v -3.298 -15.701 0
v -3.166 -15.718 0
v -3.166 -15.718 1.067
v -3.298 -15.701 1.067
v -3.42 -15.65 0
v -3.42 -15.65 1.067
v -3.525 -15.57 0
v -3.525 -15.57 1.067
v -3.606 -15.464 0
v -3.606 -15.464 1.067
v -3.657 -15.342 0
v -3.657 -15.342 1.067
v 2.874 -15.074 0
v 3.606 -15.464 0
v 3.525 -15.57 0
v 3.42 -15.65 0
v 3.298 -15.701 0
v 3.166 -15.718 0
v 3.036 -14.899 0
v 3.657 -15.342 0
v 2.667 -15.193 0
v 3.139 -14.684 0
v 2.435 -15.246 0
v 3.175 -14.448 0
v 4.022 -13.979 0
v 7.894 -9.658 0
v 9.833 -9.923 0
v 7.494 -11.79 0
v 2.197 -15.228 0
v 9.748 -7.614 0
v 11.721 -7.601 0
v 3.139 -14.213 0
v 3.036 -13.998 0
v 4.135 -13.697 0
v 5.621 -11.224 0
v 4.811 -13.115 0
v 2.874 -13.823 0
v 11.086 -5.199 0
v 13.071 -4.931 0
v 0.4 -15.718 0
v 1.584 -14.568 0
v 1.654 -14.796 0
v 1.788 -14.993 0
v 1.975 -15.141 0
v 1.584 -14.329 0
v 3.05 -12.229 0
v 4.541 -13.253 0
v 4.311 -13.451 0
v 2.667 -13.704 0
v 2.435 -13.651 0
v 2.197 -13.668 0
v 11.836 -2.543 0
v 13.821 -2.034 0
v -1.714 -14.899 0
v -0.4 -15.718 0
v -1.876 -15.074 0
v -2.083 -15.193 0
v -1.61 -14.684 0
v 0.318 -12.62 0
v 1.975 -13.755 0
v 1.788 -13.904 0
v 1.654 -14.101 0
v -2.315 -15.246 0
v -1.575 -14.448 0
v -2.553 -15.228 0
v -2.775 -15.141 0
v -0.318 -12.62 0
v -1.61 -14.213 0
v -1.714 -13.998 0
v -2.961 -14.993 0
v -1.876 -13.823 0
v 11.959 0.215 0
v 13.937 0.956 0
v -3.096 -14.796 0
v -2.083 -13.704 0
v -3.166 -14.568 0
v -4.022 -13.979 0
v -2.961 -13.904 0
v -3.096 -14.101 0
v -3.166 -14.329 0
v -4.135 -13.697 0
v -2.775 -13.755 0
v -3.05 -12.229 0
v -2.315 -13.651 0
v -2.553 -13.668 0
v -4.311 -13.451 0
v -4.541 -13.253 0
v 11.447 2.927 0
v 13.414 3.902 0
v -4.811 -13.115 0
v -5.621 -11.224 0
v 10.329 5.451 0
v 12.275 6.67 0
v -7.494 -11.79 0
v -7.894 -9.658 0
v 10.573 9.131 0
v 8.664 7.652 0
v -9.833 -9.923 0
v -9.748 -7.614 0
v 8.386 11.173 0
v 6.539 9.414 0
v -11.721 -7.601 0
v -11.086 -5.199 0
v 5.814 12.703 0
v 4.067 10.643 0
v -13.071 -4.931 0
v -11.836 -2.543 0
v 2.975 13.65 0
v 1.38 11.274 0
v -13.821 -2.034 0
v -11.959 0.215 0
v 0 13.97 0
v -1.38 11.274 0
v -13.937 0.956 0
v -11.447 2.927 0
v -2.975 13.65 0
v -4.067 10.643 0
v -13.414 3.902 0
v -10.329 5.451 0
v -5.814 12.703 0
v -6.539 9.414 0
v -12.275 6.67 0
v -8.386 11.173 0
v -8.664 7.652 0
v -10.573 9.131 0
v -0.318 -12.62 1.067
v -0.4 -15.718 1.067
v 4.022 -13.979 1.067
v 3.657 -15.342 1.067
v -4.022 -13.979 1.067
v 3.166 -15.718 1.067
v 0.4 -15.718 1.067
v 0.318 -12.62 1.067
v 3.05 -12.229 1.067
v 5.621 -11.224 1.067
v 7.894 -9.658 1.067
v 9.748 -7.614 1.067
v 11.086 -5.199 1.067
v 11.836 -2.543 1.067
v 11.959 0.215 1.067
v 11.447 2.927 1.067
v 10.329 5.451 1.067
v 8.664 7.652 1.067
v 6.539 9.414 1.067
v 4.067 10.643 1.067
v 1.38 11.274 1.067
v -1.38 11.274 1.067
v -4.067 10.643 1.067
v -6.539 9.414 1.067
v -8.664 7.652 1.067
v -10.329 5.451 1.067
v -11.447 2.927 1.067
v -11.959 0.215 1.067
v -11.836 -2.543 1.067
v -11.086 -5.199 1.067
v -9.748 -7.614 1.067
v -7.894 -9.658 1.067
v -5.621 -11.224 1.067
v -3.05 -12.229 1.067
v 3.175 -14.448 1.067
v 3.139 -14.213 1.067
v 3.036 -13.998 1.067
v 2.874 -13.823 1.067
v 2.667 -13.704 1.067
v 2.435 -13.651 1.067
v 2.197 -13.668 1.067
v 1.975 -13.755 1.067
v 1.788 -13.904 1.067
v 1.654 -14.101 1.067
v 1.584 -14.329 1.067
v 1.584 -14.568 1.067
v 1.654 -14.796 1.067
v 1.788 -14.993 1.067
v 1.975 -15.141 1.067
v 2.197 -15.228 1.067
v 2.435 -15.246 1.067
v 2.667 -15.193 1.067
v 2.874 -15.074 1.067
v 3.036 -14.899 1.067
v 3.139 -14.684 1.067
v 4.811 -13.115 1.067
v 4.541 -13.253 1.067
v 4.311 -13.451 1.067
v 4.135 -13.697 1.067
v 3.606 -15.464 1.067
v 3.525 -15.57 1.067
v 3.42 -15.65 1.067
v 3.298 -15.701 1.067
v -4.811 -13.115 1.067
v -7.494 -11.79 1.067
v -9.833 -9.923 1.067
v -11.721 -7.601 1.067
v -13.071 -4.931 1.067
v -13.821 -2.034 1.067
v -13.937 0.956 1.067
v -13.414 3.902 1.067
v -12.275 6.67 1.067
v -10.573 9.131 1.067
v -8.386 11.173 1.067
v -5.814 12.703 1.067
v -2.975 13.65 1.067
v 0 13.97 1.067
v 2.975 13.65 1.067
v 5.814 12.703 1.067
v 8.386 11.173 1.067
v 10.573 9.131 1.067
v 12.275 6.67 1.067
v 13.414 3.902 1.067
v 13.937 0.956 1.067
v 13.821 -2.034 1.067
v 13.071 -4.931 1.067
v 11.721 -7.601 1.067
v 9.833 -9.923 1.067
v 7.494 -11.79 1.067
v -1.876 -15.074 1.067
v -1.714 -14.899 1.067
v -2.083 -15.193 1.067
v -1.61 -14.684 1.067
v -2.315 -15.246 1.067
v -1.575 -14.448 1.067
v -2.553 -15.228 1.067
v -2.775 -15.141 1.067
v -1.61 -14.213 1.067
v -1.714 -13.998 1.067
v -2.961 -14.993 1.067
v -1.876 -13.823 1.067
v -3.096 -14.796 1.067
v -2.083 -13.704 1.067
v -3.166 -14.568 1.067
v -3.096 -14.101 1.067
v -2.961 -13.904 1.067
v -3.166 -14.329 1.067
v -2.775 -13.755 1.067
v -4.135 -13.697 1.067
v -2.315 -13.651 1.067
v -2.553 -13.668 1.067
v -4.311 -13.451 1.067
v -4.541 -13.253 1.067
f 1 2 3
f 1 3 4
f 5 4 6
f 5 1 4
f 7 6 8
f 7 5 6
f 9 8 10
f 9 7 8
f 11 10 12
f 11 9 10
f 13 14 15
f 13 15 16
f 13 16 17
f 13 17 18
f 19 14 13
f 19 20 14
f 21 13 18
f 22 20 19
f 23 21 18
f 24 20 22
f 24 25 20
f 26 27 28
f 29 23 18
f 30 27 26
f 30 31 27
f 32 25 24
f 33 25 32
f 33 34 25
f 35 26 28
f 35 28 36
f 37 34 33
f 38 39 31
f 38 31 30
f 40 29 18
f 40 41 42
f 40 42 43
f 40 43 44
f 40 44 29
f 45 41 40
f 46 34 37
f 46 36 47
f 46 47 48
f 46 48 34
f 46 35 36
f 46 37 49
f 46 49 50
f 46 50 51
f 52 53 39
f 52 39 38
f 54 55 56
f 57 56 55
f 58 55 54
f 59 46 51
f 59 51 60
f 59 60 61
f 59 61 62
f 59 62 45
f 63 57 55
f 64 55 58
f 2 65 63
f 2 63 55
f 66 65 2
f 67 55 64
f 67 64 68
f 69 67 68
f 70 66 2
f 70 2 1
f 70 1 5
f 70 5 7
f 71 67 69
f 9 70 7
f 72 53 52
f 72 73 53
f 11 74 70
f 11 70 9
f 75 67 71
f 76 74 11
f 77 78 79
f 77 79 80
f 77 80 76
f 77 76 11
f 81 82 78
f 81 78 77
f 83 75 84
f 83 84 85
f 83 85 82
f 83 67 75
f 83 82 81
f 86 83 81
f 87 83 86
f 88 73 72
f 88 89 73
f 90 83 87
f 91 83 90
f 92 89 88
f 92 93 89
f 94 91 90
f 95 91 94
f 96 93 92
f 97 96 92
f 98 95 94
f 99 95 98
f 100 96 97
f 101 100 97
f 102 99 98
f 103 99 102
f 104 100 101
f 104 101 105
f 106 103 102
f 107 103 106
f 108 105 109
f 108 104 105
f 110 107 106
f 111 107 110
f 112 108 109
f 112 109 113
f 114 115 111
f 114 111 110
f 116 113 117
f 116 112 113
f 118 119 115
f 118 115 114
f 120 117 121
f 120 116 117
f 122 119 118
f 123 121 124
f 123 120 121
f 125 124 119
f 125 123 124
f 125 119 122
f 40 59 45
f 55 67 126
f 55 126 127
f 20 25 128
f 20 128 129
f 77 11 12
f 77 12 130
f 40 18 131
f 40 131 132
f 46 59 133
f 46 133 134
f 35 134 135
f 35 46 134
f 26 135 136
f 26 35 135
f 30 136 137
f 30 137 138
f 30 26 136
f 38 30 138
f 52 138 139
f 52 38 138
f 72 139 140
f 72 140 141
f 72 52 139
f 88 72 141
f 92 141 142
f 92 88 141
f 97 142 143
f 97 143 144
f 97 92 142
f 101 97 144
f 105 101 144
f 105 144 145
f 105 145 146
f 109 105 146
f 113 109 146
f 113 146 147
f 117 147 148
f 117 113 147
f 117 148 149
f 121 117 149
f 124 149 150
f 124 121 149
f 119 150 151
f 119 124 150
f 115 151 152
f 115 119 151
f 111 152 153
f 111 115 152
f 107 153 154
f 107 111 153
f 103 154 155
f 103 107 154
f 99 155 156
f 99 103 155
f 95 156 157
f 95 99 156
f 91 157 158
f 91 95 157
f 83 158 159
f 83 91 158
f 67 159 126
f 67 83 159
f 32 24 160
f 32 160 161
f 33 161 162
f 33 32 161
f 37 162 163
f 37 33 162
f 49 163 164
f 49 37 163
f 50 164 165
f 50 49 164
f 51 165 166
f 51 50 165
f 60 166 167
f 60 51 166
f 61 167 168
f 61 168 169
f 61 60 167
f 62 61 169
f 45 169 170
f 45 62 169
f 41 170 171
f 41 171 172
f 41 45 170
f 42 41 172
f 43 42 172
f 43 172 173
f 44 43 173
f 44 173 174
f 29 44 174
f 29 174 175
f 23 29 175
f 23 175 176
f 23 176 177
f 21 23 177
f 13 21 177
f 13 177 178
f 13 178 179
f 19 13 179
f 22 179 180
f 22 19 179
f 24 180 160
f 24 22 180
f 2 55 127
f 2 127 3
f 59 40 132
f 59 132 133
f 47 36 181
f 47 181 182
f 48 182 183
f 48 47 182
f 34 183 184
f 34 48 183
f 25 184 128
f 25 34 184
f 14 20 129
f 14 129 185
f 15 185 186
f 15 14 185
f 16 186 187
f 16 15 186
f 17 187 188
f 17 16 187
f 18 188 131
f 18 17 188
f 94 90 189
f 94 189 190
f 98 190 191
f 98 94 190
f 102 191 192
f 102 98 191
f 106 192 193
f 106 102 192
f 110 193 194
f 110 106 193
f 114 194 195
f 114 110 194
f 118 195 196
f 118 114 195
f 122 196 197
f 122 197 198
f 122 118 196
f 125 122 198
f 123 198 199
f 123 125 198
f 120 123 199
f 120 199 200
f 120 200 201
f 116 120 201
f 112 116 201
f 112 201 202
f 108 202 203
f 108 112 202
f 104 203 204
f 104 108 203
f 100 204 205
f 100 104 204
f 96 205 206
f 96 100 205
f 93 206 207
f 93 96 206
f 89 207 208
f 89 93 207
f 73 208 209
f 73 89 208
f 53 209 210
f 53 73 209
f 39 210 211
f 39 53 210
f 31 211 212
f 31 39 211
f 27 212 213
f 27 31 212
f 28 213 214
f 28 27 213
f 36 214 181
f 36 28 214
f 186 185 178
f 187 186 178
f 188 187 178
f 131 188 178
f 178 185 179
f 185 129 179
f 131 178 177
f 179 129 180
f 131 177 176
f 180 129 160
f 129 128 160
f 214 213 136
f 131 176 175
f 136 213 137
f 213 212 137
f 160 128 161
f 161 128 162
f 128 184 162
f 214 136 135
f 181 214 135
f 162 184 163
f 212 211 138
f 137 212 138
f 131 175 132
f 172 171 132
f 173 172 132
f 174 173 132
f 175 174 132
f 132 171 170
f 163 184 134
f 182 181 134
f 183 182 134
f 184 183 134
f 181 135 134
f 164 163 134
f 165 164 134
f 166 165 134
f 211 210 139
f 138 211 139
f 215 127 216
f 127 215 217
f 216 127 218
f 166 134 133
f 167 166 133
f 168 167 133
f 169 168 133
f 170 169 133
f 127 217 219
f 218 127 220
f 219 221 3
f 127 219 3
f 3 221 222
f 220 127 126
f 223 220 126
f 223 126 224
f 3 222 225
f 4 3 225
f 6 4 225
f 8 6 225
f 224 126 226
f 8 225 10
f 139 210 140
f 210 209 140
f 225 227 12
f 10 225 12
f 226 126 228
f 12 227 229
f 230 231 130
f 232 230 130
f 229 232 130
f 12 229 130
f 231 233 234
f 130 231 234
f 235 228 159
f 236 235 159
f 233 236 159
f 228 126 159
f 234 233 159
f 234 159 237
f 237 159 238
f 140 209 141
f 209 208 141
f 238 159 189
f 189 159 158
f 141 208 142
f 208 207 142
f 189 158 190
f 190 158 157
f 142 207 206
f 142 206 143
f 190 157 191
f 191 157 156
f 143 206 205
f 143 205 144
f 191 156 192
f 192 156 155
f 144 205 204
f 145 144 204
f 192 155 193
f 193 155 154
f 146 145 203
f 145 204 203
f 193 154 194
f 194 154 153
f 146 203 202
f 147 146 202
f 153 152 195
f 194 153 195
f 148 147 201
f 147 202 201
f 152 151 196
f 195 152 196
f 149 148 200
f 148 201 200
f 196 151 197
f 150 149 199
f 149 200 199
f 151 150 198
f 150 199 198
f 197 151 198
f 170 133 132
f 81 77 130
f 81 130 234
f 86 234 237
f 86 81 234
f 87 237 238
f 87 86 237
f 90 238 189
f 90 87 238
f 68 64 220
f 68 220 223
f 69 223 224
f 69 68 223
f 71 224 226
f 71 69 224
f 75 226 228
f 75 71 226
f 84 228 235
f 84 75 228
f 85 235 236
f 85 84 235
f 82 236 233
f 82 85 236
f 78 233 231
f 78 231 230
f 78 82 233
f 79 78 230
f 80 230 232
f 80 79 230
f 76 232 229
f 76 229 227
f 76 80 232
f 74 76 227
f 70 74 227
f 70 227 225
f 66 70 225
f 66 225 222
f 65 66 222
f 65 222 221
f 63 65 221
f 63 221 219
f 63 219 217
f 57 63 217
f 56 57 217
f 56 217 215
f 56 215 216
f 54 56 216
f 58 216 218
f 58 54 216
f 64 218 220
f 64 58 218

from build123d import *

# Parameters (mm, degrees)
SKETCH1_R           = 0.8001
BOSS_EXTRUDE1_DEPTH = 1.0668


with BuildPart() as part:
    # Sketch1 → Boss-Extrude1 (new body)
    with BuildSketch(Plane.XY):
        with BuildLine():
            Line((3.16619789, -15.718395078), (0.399594472, -15.718395078))
            Line((0.399594472, -15.718395078), (0.3175, -12.619595078))
            ThreePointArc((0.3175, -12.619595078), (0, 11.3538), (-0.3175, -12.619595078))
            Line((-0.3175, -12.619595078), (-0.399594472, -15.718395078))
            Line((-0.399594472, -15.718395078), (-3.16619789, -15.718395078))
            ThreePointArc((-3.16619789, -15.718395078), (-3.475448696, -15.613418575), (-3.65688821, -15.341875153))
            Line((-3.65688821, -15.341875153), (-4.02209585, -13.978901683))
            ThreePointArc((-4.02209585, -13.978901683), (-4.311388241, -13.450794656), (-4.811419846, -13.115301715))
            ThreePointArc((-4.811419846, -13.115301715), (0, 13.97), (4.811419846, -13.115301715))
            ThreePointArc((4.811419846, -13.115301715), (4.311388241, -13.450794656), (4.02209585, -13.978901683))
            Line((4.02209585, -13.978901683), (3.65688821, -15.341875153))
            ThreePointArc((3.65688821, -15.341875153), (3.475448696, -15.613418575), (3.16619789, -15.718395078))
        make_face()
        with Locations((-2.3749, -14.448395078)):
            Circle(SKETCH1_R, mode=Mode.SUBTRACT)
        with Locations((2.3749, -14.448395078)):
            Circle(SKETCH1_R, mode=Mode.SUBTRACT)
    extrude(amount=BOSS_EXTRUDE1_DEPTH)


solid = part.part
